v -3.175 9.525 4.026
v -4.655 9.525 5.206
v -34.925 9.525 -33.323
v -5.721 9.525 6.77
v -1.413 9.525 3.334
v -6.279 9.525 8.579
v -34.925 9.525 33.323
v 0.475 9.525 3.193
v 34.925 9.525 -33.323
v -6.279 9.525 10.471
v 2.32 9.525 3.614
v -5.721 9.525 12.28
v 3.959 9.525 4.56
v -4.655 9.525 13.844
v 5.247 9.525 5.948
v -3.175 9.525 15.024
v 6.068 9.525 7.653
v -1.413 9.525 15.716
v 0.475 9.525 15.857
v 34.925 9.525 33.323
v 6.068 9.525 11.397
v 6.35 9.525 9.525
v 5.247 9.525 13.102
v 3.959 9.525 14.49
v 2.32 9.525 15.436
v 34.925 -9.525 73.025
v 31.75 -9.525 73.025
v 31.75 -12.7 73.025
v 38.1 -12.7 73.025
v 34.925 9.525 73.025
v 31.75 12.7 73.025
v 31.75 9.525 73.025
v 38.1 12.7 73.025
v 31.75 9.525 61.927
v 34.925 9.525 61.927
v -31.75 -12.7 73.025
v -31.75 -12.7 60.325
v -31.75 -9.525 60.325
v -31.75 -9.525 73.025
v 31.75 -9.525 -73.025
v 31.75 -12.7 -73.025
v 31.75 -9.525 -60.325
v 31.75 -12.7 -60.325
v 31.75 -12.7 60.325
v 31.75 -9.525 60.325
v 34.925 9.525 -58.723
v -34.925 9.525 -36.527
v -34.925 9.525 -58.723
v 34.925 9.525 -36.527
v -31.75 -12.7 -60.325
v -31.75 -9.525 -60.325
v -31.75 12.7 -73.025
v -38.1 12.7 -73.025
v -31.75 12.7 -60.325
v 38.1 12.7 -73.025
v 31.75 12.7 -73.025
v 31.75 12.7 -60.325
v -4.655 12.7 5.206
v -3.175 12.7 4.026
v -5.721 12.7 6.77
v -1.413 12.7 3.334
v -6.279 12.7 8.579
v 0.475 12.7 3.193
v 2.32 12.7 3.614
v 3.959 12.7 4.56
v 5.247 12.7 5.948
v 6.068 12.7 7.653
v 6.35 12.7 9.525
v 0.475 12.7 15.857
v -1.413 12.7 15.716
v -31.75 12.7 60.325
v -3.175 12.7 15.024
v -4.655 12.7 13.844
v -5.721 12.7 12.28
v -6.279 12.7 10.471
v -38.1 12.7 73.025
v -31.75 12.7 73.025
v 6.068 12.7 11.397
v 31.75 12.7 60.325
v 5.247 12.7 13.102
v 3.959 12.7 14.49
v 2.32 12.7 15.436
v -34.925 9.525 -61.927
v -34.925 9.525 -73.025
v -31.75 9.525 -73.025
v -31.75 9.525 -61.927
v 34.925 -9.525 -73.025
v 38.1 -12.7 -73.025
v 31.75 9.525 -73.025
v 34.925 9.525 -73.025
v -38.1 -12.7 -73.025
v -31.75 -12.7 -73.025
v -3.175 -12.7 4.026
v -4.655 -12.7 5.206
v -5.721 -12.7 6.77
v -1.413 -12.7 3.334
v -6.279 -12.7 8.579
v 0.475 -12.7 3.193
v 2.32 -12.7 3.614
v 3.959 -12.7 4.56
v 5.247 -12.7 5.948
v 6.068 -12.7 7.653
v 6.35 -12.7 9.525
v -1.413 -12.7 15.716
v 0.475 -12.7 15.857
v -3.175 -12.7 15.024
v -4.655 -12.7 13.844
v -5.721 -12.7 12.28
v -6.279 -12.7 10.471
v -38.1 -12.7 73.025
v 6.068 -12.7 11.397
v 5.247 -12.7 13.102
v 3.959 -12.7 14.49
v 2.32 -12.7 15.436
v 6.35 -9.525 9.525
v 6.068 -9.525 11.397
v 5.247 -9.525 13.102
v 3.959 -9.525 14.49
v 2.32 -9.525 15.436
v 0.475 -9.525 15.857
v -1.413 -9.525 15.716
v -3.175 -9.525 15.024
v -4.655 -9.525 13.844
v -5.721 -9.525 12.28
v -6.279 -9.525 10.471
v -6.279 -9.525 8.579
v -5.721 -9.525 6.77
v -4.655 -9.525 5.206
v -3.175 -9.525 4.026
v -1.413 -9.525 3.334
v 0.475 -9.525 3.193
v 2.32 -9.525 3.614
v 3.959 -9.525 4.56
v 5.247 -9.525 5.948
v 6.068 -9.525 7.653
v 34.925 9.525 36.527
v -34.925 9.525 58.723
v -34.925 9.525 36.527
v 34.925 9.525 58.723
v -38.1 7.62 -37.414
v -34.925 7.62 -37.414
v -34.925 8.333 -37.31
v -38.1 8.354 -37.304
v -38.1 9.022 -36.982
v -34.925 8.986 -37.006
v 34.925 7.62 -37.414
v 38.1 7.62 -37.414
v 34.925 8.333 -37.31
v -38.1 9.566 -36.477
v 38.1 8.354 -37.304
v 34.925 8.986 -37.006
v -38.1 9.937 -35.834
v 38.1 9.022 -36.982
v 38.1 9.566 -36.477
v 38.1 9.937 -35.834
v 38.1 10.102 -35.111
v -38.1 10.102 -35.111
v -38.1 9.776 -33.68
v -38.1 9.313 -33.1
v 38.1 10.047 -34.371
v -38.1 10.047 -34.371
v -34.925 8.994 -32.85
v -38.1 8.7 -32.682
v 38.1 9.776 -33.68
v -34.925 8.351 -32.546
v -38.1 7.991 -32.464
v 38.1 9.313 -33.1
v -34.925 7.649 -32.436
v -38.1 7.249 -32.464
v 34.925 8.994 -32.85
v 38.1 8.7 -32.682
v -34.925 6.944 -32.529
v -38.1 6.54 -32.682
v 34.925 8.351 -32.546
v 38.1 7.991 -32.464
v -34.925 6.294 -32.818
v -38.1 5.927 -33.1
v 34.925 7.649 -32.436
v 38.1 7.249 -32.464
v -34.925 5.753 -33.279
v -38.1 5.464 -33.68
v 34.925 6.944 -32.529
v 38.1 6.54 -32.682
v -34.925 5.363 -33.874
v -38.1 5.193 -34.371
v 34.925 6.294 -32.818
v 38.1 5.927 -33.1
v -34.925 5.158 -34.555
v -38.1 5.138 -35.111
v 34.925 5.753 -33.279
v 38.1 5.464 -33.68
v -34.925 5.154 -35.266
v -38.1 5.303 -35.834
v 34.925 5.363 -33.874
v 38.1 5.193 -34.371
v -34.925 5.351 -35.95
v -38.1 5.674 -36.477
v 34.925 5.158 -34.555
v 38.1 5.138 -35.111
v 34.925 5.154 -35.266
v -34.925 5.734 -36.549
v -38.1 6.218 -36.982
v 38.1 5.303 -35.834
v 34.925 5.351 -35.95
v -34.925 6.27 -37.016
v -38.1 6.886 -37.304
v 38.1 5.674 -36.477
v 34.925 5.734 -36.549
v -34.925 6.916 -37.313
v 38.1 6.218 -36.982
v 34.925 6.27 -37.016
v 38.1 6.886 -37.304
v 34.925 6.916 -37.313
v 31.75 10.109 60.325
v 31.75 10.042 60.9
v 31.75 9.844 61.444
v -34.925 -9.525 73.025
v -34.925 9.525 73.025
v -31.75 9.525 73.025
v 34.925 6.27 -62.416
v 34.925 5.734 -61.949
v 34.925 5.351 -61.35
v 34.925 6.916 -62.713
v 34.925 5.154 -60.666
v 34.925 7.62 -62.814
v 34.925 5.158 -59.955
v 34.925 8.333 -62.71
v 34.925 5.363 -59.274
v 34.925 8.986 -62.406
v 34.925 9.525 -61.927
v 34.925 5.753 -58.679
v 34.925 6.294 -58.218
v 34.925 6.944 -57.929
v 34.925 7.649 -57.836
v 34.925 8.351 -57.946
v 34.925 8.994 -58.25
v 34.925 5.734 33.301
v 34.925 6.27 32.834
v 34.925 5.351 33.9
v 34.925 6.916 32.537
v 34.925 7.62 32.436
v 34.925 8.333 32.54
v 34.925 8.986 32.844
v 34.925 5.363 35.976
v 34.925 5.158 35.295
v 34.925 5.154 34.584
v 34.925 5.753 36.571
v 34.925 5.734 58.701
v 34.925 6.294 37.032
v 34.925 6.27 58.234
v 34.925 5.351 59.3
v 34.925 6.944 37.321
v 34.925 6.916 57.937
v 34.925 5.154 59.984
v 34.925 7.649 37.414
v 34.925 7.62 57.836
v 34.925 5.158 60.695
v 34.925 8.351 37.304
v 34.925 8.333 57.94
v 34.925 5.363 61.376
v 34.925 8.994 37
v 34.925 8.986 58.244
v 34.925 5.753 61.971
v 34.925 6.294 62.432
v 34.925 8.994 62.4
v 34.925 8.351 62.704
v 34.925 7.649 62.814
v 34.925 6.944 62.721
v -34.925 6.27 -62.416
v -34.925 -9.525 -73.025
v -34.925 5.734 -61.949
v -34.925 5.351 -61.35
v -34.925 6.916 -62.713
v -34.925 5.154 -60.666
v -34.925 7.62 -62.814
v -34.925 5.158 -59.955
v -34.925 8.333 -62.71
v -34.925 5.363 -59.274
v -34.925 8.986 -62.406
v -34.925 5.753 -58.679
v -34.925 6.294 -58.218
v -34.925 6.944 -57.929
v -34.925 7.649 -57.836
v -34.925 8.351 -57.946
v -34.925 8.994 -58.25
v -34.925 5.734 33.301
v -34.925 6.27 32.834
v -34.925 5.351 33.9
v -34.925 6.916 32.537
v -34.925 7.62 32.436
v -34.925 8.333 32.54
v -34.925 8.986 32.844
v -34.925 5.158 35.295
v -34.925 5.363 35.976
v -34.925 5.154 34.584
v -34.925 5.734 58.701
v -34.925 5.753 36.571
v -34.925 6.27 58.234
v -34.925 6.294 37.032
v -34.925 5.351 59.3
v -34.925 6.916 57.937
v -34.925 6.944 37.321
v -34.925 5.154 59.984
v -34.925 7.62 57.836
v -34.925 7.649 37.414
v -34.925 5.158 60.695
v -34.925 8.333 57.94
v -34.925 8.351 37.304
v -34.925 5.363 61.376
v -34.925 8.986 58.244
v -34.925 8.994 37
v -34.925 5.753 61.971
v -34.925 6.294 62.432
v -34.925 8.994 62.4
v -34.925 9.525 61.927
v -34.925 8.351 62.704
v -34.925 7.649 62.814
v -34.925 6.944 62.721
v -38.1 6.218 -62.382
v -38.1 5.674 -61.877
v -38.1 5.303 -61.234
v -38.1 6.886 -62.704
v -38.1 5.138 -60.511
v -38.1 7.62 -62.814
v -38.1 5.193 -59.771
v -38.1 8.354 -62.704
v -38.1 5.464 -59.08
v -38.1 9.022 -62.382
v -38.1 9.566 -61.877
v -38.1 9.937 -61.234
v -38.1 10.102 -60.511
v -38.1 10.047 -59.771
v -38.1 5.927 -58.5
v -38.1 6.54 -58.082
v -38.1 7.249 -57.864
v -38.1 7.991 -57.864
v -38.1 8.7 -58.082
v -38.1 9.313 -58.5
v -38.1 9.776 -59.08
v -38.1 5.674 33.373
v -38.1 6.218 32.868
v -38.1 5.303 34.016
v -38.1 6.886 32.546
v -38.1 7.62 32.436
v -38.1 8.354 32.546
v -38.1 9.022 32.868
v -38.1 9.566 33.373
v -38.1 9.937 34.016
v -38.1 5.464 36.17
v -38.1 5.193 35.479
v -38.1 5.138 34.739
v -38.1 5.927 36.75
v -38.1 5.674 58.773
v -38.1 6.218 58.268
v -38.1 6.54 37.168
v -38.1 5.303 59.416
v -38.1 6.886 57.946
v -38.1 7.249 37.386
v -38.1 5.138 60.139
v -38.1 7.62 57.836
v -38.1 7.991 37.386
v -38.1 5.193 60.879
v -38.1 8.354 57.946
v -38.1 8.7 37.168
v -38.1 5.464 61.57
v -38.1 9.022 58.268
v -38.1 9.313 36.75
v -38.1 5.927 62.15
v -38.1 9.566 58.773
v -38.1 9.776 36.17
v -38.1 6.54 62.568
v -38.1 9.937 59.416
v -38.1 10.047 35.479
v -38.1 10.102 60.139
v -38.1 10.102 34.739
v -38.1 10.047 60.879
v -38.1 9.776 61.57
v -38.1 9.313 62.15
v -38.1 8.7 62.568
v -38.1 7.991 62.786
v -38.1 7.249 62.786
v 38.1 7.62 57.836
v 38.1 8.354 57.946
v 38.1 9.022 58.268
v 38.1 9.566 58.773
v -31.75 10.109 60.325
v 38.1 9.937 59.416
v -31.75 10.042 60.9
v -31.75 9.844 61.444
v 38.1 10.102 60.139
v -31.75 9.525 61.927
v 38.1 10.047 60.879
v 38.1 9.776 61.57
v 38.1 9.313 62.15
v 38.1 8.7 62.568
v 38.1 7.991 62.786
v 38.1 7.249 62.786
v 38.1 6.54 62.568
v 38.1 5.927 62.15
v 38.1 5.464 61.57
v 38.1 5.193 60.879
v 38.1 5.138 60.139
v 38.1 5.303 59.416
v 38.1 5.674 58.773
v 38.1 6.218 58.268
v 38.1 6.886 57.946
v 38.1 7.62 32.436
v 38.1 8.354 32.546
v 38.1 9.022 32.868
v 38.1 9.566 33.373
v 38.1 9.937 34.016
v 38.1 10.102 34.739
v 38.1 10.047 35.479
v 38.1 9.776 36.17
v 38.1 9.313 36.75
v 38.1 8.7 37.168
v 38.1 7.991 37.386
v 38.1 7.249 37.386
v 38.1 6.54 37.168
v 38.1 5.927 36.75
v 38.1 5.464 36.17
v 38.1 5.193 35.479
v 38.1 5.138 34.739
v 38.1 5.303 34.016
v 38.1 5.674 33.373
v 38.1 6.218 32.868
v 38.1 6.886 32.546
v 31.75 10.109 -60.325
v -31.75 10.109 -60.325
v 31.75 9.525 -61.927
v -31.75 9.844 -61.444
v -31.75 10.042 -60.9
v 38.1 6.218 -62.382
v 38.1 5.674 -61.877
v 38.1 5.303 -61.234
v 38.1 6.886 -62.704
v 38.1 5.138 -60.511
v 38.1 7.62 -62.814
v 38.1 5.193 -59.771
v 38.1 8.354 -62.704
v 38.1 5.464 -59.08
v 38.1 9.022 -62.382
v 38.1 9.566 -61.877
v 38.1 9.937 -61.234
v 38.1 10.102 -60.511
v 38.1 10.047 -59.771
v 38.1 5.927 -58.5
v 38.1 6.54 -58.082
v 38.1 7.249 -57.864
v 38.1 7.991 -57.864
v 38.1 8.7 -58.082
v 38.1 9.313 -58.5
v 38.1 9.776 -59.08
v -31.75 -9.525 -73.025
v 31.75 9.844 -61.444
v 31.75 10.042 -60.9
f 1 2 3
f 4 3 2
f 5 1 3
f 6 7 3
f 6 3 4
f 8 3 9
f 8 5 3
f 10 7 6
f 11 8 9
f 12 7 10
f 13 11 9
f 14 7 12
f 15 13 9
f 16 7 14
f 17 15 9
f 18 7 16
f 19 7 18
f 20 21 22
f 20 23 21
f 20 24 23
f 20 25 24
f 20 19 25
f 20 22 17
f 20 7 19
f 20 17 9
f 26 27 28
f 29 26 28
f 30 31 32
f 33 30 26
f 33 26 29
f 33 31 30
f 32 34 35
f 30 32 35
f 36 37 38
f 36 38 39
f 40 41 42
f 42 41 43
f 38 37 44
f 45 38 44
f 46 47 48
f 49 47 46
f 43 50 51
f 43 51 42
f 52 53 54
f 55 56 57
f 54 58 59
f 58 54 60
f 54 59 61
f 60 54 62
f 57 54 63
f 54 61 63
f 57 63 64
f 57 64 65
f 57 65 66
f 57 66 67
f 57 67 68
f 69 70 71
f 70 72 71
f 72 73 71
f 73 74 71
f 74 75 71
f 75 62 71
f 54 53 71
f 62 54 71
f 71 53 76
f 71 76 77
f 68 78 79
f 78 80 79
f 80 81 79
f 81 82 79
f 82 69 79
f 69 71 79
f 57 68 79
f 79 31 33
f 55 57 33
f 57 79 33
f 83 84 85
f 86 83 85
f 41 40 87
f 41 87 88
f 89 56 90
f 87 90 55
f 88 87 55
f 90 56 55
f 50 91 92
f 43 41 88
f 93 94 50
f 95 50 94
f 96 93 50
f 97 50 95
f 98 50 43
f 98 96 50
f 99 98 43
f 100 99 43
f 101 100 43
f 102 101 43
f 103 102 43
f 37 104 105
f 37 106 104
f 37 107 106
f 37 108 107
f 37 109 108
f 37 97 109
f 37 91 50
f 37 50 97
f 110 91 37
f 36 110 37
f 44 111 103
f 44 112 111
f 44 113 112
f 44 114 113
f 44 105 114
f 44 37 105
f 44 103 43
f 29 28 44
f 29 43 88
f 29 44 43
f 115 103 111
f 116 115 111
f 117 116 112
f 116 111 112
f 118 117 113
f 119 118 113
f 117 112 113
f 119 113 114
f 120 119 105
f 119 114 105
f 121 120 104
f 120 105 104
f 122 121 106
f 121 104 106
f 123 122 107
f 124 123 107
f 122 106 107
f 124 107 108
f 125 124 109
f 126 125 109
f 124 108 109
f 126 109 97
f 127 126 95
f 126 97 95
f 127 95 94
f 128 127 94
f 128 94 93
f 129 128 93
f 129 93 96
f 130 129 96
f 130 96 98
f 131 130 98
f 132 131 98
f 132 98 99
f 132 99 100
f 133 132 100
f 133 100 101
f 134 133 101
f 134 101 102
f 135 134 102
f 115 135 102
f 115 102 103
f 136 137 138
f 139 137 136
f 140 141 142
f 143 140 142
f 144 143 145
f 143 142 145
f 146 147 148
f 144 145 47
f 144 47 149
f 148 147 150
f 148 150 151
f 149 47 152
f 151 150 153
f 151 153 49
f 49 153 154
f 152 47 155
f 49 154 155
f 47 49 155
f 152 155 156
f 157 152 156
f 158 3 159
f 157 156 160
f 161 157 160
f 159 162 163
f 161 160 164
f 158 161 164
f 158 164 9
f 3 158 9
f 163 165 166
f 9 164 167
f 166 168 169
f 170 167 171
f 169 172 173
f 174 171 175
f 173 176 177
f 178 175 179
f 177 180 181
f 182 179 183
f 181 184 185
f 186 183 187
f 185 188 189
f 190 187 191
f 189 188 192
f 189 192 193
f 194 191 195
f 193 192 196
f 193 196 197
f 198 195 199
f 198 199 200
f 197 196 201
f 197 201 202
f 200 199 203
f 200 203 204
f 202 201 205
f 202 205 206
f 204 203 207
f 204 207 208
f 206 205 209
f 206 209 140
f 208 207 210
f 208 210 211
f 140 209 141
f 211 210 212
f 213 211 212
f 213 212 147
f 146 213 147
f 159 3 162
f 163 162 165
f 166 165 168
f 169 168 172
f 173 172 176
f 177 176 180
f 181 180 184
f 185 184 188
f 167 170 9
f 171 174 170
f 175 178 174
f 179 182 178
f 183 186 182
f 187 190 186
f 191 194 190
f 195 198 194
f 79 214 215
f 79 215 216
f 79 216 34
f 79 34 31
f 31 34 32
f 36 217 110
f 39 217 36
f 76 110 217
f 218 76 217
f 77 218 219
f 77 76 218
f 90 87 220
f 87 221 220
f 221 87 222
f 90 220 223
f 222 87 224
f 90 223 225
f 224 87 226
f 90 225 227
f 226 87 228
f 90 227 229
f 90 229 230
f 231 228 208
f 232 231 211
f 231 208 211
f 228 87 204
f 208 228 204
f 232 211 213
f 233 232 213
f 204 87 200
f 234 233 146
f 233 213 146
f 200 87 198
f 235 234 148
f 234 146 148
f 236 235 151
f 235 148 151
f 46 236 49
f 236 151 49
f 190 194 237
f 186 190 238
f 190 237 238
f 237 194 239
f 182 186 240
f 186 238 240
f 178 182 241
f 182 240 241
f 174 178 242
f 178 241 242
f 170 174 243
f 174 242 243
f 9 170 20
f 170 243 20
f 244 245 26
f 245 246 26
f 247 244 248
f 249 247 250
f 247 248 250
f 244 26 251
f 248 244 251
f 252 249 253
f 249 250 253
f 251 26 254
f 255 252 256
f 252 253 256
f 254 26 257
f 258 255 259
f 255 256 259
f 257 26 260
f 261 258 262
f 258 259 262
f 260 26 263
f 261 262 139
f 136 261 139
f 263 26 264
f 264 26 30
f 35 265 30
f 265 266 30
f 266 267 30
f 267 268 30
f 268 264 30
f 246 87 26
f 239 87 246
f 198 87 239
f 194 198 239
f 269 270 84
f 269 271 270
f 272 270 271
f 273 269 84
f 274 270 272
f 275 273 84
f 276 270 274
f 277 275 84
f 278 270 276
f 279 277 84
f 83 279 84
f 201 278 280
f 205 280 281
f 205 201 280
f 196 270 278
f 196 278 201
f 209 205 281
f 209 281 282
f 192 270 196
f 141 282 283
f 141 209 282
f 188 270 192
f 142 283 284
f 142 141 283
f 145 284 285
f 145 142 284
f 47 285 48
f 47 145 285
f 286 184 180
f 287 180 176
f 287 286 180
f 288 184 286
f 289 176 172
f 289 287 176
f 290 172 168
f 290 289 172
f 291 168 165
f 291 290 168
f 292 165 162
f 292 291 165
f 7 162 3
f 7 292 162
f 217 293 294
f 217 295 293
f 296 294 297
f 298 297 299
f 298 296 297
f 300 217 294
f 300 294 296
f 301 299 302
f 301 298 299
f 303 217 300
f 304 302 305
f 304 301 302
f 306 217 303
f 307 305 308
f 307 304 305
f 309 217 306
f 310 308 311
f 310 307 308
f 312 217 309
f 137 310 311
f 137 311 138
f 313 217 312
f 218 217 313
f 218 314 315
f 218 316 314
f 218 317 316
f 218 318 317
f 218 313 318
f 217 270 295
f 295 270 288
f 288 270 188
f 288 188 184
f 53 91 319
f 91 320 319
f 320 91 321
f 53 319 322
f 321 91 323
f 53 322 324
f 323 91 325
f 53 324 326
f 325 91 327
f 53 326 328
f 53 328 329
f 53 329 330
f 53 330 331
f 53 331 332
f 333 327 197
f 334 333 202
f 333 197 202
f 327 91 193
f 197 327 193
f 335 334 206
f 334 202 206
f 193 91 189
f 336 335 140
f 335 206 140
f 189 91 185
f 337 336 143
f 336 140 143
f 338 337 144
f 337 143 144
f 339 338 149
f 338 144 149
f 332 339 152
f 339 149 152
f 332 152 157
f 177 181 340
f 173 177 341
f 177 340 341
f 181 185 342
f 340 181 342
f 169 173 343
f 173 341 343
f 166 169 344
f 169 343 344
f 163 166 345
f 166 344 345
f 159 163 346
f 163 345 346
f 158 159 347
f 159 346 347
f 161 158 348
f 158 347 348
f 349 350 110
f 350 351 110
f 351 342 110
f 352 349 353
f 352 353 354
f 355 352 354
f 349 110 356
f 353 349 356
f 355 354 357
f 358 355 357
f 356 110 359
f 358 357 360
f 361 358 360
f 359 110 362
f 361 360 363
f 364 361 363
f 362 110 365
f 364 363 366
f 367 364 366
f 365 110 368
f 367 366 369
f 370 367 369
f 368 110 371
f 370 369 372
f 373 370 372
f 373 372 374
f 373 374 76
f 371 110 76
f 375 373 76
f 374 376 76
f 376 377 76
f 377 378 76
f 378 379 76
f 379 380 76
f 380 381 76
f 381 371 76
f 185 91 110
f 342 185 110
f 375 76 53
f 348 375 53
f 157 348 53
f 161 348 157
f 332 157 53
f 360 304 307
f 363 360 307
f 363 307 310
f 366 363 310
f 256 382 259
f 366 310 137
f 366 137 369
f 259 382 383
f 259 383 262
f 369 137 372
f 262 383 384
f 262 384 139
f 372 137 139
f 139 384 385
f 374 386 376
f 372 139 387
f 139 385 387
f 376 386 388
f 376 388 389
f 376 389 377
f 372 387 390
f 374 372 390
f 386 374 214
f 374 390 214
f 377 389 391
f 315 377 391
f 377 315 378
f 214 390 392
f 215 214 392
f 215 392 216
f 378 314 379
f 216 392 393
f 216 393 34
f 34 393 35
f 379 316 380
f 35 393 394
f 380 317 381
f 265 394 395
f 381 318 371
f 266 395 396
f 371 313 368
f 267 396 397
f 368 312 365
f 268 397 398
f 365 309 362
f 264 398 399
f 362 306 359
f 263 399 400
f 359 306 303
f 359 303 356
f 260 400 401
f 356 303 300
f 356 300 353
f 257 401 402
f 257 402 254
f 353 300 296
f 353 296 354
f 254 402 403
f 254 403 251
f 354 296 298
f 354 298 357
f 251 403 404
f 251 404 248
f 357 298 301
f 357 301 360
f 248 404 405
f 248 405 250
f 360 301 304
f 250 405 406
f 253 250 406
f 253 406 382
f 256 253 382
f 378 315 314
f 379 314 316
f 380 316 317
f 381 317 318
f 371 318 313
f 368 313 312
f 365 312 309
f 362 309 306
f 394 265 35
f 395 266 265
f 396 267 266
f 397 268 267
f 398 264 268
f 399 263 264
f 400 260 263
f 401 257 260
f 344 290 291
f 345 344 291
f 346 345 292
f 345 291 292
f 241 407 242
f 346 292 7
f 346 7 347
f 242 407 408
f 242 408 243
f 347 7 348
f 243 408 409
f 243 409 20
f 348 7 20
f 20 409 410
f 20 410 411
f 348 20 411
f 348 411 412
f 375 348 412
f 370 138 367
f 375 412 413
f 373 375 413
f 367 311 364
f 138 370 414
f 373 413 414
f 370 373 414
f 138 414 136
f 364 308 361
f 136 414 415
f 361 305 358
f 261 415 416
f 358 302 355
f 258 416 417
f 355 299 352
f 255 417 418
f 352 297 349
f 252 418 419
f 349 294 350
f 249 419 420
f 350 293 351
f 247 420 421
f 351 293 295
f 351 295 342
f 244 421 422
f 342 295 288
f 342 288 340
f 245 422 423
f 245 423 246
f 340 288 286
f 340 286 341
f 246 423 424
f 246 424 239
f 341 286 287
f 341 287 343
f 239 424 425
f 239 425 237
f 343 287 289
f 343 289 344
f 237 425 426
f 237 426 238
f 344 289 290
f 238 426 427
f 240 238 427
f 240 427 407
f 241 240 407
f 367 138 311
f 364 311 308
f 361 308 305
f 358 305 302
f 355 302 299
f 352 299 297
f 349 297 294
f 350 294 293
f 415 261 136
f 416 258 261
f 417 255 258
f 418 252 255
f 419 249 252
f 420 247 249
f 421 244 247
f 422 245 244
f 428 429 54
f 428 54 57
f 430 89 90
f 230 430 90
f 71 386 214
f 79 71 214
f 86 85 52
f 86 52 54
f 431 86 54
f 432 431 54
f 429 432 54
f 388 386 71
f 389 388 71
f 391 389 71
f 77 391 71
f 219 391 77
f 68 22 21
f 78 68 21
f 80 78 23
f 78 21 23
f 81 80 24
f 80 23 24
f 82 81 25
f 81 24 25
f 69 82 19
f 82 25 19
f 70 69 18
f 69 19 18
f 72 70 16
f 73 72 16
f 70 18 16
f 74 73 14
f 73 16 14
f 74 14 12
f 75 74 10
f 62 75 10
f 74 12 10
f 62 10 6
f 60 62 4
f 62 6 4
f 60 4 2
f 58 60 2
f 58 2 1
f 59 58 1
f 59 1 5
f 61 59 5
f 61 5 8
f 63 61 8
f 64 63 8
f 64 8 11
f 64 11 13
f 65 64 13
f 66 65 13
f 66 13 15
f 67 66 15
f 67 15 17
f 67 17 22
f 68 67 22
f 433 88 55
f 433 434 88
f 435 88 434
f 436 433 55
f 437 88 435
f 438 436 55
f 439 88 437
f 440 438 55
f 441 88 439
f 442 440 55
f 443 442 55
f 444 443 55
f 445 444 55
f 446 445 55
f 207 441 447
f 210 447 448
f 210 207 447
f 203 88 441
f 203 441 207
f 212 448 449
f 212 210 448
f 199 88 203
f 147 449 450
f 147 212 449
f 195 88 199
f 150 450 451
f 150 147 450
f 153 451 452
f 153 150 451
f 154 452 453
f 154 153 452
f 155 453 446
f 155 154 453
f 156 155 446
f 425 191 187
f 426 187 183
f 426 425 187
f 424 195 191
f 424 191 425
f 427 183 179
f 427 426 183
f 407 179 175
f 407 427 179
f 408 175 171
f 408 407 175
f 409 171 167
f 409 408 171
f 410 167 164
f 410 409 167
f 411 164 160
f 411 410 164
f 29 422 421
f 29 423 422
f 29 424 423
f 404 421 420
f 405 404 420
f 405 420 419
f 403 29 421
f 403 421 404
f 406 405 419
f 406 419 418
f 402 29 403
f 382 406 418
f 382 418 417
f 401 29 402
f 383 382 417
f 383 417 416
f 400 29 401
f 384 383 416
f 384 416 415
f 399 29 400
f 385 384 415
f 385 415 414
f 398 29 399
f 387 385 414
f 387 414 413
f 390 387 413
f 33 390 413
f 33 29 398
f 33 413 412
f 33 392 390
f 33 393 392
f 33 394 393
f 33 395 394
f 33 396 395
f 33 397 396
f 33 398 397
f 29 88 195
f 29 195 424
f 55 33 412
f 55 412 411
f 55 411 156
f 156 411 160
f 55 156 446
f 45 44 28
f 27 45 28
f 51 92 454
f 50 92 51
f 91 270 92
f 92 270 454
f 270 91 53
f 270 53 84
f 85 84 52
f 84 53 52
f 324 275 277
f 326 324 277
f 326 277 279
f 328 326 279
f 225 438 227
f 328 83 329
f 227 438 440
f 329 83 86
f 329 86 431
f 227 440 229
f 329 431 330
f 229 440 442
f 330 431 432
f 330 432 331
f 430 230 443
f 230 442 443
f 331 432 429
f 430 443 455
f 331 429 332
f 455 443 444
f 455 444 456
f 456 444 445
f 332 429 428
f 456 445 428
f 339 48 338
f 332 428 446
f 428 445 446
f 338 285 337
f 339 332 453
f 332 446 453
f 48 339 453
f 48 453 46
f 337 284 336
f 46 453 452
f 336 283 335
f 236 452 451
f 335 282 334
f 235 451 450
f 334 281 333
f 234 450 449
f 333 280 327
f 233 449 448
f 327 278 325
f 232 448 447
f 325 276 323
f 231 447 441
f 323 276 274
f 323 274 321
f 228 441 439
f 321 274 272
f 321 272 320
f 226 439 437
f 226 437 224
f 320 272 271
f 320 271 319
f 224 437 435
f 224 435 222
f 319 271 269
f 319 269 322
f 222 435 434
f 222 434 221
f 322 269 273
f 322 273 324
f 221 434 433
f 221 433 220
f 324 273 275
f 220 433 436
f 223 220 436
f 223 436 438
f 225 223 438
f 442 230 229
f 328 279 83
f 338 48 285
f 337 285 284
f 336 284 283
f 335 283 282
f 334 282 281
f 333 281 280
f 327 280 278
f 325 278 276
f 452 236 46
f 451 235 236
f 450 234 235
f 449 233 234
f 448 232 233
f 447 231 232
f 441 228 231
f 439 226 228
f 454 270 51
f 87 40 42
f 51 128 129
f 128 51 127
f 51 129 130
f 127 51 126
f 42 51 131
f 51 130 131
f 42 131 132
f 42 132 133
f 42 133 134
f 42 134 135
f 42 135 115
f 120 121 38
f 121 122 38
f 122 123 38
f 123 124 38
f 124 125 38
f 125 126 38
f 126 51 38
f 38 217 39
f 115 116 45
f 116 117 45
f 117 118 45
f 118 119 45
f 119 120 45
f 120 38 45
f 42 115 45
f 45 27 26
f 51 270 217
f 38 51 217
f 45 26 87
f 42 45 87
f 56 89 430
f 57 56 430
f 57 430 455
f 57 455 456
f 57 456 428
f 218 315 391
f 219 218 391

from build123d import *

# Parameters (mm, degrees)
SKETCH1_W               = 76.2
SKETCH1_H               = 25.4
SKETCH1_W_2             = 69.85
SKETCH1_H_2             = 19.05
EXTRUDE_THIN1_DEPTH     = 73.025
SKETCH2_W               = 63.5
SKETCH2_H               = 12.7
CUT_EXTRUDE1_DEPTH      = 26.4
SKETCH3_R               = 2.4892
CUT_EXTRUDE2_DEPTH      = 1
CUT_EXTRUDE2_DEPTH_BACK = 77.2
SKETCH4_R               = 6.35
CUT_EXTRUDE3_DEPTH      = 26.4


with BuildPart() as part:
    # Sketch1 → Extrude-Thin1 (new body, symmetric)
    with BuildSketch(Plane.XY):
        Rectangle(SKETCH1_W, SKETCH1_H)
        Rectangle(SKETCH1_W_2, SKETCH1_H_2, mode=Mode.SUBTRACT)
    extrude(amount=EXTRUDE_THIN1_DEPTH, both=True)

    # Sketch2 → Cut-Extrude1 (cut, through all)
    with BuildSketch(Plane.XZ.offset(12.7)):
        with Locations((0, -66.675)):
            Rectangle(SKETCH2_W, SKETCH2_H)
        with Locations((0, 66.675)):
            Rectangle(SKETCH2_W, SKETCH2_H)
    extrude(amount=-CUT_EXTRUDE1_DEPTH, mode=Mode.SUBTRACT)

    # Sketch3 → Cut-Extrude2 (cut, two sides)
    with BuildSketch(Plane(origin=(38.1, 0, 0), x_dir=(0, 0, -1), z_dir=(1, 0, 0))) as cut_extrude2_sk:
        with Locations((60.325, 7.62)):
            Circle(SKETCH3_R)
        with Locations((34.925, 7.62)):
            Circle(SKETCH3_R)
        with Locations((-34.925, 7.62)):
            Circle(SKETCH3_R)
        with Locations((-60.325, 7.62)):
            Circle(SKETCH3_R)
    extrude(amount=CUT_EXTRUDE2_DEPTH, mode=Mode.SUBTRACT)
    extrude(cut_extrude2_sk.sketch, amount=-CUT_EXTRUDE2_DEPTH_BACK, mode=Mode.SUBTRACT)

    # Sketch4 → Cut-Extrude3 (cut, through all)
    with BuildSketch(Plane.XZ.offset(12.7)):
        with Locations((0, 9.525)):
            Circle(SKETCH4_R)
    extrude(amount=-CUT_EXTRUDE3_DEPTH, mode=Mode.SUBTRACT)


solid = part.part
